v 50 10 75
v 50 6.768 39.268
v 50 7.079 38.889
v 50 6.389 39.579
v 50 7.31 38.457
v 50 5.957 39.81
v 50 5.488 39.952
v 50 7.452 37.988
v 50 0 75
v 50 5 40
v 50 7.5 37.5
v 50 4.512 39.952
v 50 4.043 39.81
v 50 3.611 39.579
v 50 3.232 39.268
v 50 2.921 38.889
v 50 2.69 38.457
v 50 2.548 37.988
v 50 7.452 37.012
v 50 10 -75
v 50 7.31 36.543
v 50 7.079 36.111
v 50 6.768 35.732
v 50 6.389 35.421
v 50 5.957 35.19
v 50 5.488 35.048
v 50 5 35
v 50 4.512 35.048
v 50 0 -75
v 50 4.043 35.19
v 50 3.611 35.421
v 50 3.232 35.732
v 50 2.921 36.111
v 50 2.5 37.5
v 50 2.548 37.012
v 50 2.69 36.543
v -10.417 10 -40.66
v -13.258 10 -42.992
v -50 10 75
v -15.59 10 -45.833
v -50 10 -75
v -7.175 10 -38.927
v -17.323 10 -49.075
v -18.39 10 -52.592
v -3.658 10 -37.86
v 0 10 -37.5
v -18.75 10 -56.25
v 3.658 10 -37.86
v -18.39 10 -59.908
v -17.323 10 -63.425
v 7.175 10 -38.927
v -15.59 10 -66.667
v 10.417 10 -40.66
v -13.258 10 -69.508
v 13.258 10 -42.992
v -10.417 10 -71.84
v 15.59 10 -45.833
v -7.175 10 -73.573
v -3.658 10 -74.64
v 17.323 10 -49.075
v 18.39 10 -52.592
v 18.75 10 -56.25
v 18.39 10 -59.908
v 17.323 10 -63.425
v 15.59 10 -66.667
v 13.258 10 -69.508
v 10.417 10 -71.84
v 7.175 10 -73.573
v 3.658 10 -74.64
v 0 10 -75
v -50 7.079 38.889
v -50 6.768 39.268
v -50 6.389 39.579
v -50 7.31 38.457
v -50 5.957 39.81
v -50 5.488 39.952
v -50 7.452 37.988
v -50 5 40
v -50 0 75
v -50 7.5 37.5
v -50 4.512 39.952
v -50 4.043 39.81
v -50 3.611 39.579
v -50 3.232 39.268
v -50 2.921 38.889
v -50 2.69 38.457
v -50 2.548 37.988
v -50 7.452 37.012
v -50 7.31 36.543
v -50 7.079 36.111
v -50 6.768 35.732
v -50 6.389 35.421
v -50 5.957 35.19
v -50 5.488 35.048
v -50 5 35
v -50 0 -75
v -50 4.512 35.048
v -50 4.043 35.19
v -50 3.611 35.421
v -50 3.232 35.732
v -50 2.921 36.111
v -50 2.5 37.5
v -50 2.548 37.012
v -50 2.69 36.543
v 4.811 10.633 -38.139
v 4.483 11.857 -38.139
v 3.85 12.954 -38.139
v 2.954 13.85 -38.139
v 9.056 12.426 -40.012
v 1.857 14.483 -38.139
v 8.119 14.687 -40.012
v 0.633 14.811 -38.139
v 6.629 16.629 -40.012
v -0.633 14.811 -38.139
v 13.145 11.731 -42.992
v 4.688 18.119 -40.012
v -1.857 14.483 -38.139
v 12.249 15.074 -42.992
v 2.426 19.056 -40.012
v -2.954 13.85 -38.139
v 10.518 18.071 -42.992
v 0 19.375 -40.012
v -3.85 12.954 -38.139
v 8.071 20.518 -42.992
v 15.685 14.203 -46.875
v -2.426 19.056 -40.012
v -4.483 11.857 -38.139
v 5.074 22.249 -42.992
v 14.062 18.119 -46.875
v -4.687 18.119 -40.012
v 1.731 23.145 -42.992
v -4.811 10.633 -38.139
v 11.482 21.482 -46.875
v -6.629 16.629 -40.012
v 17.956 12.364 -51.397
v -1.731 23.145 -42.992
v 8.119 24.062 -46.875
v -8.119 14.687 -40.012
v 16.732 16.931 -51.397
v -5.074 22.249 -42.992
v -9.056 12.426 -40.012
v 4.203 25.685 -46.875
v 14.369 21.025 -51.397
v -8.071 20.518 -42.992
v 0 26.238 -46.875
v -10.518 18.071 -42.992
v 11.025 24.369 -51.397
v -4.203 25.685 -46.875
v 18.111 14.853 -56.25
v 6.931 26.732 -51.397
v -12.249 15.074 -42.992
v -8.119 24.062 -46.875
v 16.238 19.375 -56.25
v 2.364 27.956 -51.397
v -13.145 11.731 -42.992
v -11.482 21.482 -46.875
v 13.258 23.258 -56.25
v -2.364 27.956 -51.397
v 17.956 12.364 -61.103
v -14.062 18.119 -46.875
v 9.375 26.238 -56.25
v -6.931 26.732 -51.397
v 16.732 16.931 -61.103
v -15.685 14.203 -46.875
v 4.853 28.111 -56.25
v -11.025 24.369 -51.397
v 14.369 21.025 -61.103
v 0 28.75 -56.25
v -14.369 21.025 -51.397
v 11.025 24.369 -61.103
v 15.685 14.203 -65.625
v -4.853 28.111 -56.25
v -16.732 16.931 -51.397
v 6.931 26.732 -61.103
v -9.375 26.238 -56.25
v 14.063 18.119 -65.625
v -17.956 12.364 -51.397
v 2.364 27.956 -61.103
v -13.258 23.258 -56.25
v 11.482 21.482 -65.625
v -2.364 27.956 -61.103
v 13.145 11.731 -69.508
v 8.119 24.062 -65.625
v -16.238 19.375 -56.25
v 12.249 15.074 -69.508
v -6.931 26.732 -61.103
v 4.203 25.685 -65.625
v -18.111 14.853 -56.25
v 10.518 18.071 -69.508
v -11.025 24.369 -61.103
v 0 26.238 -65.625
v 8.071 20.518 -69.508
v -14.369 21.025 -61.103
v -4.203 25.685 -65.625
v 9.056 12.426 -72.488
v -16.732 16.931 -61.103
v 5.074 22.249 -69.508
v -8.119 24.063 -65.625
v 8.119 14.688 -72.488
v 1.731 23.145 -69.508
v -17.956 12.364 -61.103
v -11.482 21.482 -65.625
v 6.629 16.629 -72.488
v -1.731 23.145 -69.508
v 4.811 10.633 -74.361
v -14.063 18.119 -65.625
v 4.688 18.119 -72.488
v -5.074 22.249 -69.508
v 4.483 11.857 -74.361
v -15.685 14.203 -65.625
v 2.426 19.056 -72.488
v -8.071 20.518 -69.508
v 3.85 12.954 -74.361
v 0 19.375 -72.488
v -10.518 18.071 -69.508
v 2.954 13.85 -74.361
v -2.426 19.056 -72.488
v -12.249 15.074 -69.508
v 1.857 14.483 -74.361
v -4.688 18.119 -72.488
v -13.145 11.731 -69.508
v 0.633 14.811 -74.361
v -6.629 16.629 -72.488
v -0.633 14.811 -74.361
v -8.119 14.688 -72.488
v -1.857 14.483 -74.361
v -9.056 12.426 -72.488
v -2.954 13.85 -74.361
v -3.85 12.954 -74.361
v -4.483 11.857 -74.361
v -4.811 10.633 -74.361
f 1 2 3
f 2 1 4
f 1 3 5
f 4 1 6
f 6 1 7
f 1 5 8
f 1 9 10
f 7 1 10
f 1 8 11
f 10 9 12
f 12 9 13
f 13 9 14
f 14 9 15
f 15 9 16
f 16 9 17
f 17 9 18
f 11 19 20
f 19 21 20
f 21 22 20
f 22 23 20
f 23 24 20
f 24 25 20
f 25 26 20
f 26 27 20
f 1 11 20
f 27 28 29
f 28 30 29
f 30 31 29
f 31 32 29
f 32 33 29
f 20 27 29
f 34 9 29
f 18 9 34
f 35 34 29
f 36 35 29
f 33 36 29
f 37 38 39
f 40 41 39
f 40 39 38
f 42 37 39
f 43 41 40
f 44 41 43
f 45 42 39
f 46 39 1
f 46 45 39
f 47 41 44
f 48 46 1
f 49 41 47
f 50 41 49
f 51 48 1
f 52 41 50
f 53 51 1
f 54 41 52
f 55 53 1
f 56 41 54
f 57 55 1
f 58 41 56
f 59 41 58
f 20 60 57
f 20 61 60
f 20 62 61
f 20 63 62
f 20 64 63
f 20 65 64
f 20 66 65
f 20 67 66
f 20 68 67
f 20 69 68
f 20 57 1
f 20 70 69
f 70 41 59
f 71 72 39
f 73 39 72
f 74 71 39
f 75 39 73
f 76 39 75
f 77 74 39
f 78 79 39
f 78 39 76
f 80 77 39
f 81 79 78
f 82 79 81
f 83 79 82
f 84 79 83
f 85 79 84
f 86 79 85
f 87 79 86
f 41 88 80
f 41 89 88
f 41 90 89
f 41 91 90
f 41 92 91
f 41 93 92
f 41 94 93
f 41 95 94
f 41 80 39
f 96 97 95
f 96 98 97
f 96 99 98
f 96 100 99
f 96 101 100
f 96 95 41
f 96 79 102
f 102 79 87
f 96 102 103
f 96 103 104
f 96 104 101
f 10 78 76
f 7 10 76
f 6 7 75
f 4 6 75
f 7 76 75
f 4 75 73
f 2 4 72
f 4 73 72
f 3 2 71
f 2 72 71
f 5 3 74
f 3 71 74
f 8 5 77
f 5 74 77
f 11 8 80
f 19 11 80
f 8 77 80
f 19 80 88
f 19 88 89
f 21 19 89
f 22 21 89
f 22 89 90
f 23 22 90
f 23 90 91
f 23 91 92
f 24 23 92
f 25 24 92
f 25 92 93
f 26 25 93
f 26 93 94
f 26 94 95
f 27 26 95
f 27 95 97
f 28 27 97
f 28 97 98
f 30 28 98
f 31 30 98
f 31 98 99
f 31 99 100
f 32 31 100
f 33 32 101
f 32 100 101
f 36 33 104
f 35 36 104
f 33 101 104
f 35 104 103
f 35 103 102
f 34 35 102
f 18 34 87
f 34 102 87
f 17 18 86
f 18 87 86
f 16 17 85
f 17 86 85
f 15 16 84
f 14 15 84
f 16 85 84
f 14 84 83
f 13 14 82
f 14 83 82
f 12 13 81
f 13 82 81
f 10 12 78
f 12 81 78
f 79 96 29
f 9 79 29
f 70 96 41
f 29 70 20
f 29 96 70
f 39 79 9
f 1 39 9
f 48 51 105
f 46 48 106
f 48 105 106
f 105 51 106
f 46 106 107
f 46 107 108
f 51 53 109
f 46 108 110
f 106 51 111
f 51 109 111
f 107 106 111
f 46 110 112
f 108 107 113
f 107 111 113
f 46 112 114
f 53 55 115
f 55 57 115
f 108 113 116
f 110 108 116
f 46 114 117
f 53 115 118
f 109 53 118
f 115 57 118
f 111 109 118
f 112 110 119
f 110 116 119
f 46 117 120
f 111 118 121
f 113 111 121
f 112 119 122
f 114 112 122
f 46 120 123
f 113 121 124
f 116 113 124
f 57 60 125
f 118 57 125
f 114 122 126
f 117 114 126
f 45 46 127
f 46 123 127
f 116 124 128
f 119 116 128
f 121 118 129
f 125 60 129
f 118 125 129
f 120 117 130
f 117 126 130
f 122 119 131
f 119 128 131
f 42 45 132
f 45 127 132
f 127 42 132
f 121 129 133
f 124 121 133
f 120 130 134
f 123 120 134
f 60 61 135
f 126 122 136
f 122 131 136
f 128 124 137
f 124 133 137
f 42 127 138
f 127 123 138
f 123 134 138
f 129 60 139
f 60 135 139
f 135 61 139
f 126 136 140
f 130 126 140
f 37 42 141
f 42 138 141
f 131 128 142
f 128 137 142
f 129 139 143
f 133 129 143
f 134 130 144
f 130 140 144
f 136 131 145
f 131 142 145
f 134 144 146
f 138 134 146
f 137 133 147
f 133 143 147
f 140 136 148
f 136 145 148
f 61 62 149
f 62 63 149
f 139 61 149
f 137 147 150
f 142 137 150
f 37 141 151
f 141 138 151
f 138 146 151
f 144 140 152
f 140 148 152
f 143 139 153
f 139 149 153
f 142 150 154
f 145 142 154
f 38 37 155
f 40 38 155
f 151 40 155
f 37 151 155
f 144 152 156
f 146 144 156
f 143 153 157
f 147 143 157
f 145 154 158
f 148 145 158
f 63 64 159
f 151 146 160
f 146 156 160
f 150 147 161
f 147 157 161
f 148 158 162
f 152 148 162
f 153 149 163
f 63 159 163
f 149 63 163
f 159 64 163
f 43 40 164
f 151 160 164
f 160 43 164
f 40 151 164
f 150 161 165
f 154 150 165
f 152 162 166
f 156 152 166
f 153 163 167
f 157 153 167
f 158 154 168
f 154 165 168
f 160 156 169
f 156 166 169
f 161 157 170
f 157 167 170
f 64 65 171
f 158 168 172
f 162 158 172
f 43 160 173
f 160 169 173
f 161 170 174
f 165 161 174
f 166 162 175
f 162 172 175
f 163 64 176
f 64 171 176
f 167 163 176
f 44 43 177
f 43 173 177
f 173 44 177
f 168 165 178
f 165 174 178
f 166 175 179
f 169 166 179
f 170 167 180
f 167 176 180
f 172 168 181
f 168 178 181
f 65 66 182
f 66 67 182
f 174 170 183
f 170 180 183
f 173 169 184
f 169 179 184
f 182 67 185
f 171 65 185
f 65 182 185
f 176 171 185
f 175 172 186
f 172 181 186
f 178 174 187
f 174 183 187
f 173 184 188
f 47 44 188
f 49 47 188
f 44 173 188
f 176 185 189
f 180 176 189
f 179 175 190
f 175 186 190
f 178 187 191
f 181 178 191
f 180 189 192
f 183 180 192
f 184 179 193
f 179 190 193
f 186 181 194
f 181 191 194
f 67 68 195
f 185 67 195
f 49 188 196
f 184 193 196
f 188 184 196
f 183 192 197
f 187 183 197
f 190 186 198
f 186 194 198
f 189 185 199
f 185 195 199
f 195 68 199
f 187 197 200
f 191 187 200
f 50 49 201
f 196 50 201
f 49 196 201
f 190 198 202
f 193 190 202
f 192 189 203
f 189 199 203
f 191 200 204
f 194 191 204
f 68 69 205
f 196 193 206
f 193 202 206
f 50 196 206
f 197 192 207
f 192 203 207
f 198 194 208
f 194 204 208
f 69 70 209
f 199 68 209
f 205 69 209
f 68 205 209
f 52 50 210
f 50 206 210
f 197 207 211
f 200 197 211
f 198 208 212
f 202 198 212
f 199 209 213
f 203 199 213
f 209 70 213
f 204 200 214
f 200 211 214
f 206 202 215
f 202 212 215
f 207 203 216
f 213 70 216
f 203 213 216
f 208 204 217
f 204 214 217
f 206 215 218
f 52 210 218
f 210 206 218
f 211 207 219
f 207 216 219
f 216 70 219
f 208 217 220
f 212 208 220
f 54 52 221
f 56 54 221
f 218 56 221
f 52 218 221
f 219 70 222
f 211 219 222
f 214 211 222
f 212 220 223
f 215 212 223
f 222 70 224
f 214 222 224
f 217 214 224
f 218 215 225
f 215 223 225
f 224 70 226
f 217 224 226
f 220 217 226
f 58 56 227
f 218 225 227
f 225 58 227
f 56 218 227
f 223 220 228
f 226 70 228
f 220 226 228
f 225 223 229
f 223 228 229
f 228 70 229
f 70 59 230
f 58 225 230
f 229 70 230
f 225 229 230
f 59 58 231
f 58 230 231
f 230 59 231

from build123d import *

# Parameters (mm, degrees)
SKETCH_1_W          = 100
SKETCH_1_H          = 150
EXTRUDE_1_DEPTH     = 10
REVOLVE_2_ANGLE     = 180
SKETCH_3_R          = 2.5
CUT_EXTRUDE_1_DEPTH = 129.263644498


with BuildPart() as part:
    # 草圖1 → 填料-伸長1 (new body)
    with BuildSketch(Plane(origin=(0, 0, 0), x_dir=(1, 0, 0), z_dir=(0, 1, 0))):
        Rectangle(SKETCH_1_W, SKETCH_1_H)
    extrude(amount=EXTRUDE_1_DEPTH)

    # 草圖2 → 旋轉2 (revolve)
    with BuildSketch(Plane(origin=(0, 10, 0), x_dir=(1, 0, 0), z_dir=(0, 1, 0))):
        with BuildLine():
            Line((0, 75), (0, 37.5))
            ThreePointArc((0, 37.5), (18.75, 56.25), (0, 75))
        make_face()
    revolve(axis=Axis((0, 10, -75), (0, 0, 1)), revolution_arc=REVOLVE_2_ANGLE)

    # 草圖3 → 除料-伸長1 (cut, through all)
    with BuildSketch(Plane.ZY.offset(50)):
        with Locations((37.5, 5)):
            Circle(SKETCH_3_R)
    extrude(amount=-CUT_EXTRUDE_1_DEPTH, mode=Mode.SUBTRACT)


solid = part.part
